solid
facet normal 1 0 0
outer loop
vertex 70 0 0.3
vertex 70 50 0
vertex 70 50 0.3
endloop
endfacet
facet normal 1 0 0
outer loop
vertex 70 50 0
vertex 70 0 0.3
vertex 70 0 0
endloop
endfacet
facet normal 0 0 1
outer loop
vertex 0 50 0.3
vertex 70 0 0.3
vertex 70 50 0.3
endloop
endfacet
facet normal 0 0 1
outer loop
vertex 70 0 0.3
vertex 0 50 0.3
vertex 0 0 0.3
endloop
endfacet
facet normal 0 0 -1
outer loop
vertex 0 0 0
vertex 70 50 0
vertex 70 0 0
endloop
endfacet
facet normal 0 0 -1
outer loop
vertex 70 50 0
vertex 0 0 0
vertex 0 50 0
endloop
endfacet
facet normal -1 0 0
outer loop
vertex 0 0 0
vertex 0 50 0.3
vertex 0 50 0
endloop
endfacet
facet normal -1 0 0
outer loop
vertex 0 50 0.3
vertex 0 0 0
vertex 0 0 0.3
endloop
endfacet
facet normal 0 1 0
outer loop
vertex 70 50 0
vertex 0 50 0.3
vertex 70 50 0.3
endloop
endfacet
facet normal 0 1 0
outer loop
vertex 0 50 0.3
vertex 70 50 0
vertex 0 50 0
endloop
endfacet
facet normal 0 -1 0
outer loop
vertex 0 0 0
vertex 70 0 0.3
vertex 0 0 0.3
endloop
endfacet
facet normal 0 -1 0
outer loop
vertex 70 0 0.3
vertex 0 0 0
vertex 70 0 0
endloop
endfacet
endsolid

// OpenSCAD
difference() {
    cube([70, 50, .3]);
    translate([-1.5, -3, 0]) minkowski() {
        linear_extrude(.2) import("st2.dxf");
        cube(.1);
    }
}
